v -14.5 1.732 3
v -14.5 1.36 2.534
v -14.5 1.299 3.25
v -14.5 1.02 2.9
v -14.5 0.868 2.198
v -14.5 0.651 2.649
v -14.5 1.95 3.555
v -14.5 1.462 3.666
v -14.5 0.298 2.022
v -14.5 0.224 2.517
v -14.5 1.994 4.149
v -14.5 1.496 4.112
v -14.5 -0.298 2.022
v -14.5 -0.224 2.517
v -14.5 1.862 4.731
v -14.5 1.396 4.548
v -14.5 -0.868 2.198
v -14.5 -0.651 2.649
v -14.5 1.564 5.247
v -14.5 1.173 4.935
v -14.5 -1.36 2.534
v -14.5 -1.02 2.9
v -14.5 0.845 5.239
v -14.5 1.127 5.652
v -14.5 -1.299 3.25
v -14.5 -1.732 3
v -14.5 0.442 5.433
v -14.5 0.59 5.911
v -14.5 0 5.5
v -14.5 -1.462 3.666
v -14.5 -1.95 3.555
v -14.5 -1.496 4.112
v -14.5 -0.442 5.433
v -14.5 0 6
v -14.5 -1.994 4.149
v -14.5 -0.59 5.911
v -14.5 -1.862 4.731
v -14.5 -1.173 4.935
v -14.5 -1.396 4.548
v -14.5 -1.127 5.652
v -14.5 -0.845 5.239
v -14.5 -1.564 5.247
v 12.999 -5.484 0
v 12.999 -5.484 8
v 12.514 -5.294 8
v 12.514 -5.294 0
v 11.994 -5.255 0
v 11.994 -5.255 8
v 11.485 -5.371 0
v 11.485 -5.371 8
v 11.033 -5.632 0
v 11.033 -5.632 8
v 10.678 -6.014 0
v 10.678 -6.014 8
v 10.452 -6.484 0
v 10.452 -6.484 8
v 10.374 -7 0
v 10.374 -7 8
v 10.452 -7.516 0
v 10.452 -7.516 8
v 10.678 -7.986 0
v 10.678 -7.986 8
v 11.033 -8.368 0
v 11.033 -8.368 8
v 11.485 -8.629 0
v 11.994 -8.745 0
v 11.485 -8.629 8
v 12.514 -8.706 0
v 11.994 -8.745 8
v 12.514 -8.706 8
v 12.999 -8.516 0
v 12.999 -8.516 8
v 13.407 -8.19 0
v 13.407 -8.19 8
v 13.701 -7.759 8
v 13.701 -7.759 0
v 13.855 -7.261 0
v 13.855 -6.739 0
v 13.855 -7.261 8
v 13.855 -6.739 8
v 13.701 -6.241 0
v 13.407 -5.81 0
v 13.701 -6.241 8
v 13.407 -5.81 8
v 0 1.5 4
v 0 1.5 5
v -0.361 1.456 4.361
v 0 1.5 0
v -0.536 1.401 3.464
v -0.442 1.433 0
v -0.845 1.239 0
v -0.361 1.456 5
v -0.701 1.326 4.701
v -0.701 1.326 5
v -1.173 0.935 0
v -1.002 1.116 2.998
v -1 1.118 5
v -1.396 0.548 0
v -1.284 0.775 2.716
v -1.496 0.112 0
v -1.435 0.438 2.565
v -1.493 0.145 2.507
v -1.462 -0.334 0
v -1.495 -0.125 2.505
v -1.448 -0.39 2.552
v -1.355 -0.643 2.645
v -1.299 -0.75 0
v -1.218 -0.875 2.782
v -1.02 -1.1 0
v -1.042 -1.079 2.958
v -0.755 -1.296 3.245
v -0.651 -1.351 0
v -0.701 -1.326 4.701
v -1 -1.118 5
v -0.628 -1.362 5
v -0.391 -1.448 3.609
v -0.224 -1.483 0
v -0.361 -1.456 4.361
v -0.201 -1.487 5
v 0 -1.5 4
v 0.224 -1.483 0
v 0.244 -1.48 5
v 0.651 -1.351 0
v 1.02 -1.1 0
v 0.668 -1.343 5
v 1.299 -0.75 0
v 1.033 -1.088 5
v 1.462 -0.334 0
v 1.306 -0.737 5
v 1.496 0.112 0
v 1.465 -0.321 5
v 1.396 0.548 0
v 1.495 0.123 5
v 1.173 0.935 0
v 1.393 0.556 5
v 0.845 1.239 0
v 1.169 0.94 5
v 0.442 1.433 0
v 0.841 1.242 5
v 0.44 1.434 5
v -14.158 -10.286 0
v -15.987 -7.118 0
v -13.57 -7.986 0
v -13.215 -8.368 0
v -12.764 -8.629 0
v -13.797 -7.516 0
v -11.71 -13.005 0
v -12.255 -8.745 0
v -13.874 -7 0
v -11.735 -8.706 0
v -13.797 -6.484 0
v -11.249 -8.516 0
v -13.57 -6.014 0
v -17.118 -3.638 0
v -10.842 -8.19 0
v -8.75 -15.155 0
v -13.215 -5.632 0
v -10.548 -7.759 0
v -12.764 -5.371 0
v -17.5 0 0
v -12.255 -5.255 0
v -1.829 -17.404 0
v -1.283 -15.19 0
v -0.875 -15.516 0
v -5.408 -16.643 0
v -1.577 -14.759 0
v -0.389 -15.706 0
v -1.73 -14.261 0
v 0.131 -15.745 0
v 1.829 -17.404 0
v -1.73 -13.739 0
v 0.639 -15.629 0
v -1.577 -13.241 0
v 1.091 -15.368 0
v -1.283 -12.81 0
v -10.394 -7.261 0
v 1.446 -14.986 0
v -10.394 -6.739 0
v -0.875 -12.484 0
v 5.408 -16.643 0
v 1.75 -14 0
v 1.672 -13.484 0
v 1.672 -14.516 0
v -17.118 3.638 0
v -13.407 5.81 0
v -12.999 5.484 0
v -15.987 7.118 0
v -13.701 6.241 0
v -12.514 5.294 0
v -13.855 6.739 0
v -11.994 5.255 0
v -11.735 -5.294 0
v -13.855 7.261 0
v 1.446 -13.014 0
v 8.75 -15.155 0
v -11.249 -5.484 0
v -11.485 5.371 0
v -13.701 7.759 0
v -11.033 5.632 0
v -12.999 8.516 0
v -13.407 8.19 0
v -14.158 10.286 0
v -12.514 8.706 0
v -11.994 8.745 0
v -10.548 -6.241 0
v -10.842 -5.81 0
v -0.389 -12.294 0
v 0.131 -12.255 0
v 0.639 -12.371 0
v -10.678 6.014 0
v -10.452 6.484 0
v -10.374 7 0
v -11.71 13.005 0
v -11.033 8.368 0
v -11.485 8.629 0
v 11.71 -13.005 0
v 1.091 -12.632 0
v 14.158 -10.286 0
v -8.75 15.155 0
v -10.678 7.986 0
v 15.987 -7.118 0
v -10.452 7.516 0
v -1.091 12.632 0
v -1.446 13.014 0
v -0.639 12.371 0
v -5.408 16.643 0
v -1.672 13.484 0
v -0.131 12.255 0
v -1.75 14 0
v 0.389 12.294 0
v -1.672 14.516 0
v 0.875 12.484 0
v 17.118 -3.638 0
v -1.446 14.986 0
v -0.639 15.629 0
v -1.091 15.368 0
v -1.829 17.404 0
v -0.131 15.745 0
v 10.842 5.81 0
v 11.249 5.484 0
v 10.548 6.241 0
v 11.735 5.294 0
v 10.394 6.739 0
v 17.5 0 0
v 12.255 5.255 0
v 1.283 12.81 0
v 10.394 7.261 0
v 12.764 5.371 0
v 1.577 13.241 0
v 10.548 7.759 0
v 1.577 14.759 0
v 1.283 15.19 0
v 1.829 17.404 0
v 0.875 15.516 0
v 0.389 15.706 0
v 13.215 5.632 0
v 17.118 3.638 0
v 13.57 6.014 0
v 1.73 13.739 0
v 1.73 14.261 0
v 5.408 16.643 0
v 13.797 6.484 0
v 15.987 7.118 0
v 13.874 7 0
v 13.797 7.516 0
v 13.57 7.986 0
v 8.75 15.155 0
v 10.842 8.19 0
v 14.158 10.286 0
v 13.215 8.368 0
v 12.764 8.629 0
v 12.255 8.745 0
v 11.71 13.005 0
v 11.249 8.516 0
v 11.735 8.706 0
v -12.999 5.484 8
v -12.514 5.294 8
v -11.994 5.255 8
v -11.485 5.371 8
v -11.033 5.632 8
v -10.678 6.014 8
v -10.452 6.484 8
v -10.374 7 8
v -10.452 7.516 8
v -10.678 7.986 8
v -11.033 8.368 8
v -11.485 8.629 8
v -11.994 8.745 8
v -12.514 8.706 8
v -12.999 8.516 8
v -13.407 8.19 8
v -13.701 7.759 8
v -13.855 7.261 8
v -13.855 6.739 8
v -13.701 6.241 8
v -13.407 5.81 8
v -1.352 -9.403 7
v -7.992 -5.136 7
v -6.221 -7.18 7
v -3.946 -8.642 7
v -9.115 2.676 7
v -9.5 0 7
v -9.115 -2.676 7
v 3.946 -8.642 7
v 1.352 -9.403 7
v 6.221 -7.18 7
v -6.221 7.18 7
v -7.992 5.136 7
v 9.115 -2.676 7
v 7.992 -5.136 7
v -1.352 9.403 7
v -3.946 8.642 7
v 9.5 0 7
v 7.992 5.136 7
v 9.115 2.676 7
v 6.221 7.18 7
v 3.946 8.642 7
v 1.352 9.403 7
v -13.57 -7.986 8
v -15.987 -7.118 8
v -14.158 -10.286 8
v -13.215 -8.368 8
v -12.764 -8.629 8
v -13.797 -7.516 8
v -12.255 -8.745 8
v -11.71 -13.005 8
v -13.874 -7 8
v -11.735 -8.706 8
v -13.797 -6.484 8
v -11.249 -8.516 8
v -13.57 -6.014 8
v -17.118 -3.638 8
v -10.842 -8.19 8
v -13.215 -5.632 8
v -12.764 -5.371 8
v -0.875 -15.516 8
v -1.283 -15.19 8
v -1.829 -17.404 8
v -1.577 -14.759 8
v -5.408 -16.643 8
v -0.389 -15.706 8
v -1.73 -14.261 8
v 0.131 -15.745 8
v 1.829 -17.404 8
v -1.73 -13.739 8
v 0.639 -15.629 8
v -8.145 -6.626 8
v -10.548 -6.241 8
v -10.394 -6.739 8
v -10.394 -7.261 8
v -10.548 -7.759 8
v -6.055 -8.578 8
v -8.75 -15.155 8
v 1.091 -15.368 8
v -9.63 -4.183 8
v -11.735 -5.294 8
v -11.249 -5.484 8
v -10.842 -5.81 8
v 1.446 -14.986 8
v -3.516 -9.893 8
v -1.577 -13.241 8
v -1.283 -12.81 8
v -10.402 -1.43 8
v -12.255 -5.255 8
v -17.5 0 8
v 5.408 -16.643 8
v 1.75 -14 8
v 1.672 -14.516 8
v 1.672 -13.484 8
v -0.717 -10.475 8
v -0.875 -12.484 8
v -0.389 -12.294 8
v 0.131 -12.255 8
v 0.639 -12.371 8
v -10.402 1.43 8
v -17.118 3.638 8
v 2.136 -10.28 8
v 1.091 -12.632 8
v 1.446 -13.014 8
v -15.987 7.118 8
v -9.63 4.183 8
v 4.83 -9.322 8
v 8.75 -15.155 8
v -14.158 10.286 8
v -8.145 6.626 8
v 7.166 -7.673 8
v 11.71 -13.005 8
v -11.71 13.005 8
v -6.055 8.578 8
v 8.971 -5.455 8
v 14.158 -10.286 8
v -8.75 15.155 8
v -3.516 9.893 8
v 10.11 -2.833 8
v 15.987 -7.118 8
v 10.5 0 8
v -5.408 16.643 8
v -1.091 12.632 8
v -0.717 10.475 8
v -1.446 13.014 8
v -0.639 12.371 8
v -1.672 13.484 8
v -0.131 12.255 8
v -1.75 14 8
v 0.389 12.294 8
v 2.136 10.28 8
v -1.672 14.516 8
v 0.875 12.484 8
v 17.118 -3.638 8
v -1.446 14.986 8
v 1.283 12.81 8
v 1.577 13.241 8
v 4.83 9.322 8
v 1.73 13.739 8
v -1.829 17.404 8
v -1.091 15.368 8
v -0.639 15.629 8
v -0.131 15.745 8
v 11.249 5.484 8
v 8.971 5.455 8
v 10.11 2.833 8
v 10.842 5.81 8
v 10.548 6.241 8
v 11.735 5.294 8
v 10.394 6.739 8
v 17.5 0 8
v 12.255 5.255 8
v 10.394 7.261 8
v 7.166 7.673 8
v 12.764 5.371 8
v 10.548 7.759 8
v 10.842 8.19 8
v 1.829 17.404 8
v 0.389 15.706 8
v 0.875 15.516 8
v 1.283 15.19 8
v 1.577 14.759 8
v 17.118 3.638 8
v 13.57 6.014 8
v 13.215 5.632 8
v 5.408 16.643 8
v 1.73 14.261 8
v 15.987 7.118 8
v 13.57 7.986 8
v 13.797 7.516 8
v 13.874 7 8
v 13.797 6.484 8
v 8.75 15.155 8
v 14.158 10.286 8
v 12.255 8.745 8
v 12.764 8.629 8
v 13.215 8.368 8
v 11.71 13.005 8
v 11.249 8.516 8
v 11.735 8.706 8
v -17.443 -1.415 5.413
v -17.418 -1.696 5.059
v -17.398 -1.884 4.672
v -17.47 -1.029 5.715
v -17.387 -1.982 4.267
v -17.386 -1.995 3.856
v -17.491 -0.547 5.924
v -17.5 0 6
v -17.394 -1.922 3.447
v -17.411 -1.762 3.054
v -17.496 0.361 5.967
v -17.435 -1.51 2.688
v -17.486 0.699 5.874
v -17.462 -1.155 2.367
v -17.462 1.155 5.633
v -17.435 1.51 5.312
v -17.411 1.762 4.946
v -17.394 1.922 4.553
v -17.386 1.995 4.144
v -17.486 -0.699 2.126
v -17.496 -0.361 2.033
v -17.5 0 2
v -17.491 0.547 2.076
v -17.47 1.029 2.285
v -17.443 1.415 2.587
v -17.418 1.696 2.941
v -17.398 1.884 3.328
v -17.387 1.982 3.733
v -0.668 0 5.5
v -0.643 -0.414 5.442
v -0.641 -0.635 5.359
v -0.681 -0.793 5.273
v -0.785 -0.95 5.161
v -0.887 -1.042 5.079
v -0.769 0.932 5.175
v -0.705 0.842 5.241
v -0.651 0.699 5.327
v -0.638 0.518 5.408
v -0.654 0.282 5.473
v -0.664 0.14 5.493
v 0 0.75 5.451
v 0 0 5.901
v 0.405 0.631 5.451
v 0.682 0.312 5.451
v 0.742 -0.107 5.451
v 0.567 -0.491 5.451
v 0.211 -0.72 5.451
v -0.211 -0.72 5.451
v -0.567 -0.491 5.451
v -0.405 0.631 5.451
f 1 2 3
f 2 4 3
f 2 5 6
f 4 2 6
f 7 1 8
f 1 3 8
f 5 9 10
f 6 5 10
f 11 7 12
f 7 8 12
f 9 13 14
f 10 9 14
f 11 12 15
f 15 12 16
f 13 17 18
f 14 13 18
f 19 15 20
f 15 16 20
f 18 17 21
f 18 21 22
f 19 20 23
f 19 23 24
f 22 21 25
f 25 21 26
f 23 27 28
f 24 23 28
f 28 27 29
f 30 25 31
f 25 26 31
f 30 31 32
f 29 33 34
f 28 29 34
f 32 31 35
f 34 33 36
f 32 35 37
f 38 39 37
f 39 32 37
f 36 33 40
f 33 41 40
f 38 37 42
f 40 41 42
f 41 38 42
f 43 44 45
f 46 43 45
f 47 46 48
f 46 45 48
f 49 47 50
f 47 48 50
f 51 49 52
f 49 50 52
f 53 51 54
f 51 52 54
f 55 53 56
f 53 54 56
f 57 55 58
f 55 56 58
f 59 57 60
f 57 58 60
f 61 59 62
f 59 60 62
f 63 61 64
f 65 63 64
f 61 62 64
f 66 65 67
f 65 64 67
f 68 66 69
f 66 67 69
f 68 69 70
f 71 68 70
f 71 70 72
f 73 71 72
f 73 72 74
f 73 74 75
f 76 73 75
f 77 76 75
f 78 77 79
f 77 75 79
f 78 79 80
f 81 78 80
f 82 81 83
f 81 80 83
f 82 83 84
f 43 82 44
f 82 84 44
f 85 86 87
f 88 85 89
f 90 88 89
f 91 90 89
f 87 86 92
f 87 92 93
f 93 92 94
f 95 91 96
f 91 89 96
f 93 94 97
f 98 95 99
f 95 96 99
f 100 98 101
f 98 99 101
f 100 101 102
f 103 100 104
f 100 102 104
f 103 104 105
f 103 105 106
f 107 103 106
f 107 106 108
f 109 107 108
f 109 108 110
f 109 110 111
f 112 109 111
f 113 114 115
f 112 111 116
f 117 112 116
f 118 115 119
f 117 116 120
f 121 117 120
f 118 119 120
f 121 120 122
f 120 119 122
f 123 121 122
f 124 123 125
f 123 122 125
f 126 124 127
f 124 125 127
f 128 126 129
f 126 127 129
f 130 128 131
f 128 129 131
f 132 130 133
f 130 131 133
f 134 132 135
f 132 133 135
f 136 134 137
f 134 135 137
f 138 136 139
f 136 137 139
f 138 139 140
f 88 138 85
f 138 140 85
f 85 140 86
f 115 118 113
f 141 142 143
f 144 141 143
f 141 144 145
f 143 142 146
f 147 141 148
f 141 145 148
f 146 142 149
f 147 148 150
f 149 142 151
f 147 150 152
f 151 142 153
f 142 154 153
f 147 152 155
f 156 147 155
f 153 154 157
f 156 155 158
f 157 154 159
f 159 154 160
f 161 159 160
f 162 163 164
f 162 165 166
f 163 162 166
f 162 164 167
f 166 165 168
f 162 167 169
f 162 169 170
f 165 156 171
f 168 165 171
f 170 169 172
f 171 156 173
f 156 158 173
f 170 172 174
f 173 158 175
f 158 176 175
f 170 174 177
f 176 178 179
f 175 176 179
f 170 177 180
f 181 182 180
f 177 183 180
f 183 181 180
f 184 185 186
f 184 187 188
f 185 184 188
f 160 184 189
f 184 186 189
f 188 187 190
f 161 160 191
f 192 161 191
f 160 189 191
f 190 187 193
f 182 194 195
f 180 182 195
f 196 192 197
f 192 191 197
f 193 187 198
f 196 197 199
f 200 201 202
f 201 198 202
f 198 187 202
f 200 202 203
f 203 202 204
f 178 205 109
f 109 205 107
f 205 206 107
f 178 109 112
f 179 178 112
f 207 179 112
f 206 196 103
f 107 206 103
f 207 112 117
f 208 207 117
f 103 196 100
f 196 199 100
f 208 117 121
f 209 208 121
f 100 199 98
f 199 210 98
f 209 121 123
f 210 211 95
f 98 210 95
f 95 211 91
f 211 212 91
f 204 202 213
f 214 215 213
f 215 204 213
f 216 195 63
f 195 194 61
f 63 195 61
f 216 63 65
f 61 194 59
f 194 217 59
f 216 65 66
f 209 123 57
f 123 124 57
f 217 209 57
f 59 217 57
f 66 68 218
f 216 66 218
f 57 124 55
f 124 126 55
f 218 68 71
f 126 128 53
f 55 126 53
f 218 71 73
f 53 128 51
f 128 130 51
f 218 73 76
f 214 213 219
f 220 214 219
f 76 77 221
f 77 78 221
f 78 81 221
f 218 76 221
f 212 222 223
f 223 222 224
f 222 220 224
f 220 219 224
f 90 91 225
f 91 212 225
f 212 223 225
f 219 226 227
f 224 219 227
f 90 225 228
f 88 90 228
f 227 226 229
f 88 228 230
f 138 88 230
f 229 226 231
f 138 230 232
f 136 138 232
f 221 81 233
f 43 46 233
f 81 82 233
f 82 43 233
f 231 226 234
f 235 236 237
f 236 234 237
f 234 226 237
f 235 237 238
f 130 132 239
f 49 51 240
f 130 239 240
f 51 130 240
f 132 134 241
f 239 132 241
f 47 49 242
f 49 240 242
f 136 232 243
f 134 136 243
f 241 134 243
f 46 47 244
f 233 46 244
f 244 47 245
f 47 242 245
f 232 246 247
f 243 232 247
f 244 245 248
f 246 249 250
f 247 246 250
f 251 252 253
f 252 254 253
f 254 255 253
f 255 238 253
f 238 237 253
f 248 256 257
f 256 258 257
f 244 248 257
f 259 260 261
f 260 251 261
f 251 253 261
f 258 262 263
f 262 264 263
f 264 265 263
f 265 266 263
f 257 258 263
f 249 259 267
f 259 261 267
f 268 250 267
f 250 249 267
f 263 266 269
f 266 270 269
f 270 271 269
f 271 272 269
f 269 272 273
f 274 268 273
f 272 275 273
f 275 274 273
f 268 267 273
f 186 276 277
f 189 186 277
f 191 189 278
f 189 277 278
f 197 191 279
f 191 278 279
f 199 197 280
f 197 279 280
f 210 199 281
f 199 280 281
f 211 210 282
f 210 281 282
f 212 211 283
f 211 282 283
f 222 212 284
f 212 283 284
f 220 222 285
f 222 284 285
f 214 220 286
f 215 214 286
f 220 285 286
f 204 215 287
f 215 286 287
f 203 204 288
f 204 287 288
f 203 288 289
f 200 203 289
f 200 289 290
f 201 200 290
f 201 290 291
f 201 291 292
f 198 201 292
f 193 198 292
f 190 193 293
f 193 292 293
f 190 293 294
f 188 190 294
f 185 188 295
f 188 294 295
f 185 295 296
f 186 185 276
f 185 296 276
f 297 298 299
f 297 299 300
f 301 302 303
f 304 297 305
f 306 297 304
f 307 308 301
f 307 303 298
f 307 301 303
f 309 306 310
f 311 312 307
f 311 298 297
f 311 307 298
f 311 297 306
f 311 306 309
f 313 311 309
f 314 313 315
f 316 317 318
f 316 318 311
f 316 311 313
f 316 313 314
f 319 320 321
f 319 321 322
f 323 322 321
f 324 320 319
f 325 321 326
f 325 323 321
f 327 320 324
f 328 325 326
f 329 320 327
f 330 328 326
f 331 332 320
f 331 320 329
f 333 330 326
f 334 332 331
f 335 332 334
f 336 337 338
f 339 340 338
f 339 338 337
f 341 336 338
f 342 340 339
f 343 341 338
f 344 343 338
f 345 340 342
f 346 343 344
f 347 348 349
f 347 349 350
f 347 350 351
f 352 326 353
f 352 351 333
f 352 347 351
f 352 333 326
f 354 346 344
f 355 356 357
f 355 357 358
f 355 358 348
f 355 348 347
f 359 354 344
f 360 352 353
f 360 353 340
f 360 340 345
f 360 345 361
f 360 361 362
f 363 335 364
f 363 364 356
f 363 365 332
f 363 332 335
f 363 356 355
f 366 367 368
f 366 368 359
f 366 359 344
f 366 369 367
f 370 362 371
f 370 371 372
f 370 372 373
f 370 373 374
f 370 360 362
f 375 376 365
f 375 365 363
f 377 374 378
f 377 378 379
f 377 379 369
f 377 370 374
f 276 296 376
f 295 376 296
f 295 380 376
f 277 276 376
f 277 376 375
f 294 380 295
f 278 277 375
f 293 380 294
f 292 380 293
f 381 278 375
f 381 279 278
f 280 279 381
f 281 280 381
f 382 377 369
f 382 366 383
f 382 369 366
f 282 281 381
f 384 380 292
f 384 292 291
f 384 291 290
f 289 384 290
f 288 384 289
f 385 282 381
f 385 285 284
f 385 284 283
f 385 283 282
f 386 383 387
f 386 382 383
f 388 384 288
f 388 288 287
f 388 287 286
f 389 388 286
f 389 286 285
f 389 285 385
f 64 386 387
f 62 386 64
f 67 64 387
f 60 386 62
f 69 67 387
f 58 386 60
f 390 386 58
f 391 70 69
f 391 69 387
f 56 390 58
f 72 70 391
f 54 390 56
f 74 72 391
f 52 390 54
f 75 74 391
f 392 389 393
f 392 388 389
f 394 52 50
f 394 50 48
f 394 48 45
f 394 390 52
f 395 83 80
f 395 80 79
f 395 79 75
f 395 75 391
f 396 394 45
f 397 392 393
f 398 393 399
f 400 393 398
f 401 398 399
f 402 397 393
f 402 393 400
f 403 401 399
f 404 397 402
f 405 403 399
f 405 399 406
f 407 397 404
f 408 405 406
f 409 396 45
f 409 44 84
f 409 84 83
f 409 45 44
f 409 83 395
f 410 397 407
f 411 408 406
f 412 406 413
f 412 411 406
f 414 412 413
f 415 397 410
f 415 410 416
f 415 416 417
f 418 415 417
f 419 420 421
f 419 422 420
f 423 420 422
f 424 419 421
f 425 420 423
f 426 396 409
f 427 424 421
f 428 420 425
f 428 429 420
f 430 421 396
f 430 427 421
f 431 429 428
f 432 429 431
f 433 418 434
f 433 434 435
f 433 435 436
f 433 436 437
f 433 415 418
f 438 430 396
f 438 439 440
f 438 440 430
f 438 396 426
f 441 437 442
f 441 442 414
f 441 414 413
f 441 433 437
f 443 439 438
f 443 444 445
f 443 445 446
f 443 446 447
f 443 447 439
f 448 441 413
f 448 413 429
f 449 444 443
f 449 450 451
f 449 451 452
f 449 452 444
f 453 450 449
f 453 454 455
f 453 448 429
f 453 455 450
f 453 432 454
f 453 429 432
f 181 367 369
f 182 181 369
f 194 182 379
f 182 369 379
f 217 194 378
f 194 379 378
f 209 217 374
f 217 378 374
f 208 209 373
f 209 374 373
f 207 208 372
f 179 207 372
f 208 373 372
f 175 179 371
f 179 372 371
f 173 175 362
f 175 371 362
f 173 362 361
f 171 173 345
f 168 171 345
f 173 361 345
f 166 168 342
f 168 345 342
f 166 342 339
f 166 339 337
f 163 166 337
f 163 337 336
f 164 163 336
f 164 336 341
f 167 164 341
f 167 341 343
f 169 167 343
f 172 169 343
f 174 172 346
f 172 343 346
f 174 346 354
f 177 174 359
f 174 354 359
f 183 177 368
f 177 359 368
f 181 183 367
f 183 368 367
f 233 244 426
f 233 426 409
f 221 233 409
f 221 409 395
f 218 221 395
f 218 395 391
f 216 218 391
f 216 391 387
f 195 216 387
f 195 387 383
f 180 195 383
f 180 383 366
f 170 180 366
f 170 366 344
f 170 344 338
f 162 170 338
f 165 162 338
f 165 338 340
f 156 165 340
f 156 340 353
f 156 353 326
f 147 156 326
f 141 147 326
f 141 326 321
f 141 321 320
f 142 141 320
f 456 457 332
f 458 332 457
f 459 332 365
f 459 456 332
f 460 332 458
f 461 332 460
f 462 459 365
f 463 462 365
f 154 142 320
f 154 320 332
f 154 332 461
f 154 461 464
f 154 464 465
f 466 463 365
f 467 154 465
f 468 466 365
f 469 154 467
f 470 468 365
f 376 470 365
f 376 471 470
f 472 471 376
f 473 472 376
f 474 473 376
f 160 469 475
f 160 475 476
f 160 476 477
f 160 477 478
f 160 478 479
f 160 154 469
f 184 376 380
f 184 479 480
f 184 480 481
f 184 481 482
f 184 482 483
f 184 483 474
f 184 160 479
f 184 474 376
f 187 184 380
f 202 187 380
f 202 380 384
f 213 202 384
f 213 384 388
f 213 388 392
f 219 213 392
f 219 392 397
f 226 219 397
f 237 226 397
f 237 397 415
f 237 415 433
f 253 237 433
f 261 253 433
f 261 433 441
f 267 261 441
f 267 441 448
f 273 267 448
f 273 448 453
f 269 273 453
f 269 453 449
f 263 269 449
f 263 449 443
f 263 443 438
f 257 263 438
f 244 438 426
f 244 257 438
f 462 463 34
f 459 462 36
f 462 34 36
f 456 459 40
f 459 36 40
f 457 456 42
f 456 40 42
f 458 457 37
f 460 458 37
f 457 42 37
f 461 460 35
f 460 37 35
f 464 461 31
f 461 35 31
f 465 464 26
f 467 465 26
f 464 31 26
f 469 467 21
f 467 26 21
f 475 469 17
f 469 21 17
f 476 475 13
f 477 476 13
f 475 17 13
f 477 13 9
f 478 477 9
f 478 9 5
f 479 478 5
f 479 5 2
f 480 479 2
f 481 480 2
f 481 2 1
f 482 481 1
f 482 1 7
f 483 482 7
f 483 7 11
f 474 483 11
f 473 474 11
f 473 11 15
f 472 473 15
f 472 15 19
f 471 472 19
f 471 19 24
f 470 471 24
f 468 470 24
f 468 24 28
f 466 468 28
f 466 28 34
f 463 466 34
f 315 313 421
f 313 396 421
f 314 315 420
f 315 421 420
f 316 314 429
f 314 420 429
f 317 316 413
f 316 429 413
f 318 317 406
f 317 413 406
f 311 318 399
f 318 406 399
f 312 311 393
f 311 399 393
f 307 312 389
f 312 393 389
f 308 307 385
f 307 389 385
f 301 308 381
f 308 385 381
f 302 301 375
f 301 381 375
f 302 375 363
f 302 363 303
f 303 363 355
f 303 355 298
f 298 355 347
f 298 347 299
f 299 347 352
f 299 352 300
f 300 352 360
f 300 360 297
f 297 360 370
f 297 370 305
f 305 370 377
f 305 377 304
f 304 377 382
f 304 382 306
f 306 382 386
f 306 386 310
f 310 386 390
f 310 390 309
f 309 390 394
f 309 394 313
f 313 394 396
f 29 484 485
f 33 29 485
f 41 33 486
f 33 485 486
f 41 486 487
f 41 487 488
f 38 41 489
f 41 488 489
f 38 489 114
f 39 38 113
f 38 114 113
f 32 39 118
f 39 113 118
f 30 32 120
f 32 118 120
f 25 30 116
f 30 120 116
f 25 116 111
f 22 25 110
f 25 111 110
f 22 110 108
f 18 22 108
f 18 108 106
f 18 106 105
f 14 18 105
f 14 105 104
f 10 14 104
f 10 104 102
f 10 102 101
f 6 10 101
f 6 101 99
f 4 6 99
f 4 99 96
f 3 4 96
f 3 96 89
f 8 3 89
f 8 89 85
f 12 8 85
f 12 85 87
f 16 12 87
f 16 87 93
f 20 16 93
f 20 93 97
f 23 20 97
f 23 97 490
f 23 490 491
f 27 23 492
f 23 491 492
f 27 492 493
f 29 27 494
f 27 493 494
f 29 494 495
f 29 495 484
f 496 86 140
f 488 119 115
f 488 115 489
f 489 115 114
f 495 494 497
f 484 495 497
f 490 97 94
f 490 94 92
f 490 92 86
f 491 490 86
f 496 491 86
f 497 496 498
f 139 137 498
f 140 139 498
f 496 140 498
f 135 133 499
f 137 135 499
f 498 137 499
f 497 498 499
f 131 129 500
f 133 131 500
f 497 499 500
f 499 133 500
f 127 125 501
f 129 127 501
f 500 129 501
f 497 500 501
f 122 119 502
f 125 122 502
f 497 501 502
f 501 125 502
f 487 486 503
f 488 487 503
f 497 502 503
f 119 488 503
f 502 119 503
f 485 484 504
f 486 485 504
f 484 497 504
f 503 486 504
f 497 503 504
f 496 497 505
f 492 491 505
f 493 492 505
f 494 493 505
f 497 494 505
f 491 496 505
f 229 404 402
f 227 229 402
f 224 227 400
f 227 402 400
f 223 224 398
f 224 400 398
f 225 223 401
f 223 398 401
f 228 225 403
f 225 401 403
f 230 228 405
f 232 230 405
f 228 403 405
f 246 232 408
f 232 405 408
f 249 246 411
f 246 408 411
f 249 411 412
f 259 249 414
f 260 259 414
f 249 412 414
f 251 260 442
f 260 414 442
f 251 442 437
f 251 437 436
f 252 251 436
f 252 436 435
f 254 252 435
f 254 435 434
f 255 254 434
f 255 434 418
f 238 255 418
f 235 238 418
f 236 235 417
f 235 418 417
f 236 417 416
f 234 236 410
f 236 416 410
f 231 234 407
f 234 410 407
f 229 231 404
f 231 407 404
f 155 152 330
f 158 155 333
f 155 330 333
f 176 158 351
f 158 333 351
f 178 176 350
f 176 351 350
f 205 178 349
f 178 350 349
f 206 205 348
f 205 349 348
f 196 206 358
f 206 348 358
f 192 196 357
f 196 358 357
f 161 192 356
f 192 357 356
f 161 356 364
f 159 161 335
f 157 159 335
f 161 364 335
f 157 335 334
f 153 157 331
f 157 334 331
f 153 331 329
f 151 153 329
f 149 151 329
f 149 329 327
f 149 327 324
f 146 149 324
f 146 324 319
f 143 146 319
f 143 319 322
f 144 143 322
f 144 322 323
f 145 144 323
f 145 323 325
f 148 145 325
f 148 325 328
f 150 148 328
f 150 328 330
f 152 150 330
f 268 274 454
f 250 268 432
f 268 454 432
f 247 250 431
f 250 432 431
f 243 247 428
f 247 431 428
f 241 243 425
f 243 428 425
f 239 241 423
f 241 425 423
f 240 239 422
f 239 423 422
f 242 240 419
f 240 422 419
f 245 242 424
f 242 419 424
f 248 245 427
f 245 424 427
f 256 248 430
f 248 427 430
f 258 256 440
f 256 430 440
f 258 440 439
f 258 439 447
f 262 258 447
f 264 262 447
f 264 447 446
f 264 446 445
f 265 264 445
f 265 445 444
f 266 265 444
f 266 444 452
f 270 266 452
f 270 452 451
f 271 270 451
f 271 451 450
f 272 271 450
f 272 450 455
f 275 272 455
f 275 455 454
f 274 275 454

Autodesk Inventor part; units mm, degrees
ref_plane "XZ Plane" through (0, 0, 0) normal (0, 1, 0) x (-1, 0, 0)
ref_plane "XY Plane" through (0, 0, 0) normal (0, 0, 1) x (1, 0, 0)
sketch "Skizze1" plane through (0, 0, 0) normal (0, 0, 1) x (1, 0, 0)
  circle A0 centre (0, 0) radius 17.5
  line L0 (-24.5, 0) -> (24.5, 0) projected
  line L1 (0, -24.5) -> (0, 24.5) projected
  dimension "d0" = 35
extrude "Extrusion1" add sketch "Skizze1" along normal blind 8
sketch "Skizze2" plane through (0, 0, 8) normal (0, 0, 1) x (1, 0, 0)
  line L0 (0, -24.5) -> (0, 24.5) projected
  line L1 (-24.5, 0) -> (24.5, 0) projected
  circle A0 centre (0, 0) radius 9.5
  dimension "d3" = 19
extrude "Extrusion2" cut sketch "Skizze2" against normal blind 1
chamfer "Fase1" distance 1 angle 45 1 edges at (-9.5, 0, 8)
sketch "Skizze3" plane through (0, 0, 8) normal (0, 0, 1) x (1, 0, 0)
  line L0 (0, -24.5) -> (0, 24.5) projected
  line L1 (-24.5, 0) -> (24.5, 0) projected
  circle A0 centre (0, -14) radius 1.75
  point P0 (0, 0)
  dimension "d11" = 3.5
  dimension "d12" = 14
extrude "Extrusion3" cut sketch "Skizze3" against normal up to surface (8 mm away)
pattern_circular "Runde Anordnung1" count 6 over 360 about axis through (0, 0, 7.5) along (0, 0, 1) of "Extrusion3"
sketch "Skizze4" plane through (0, 0, 0) normal (0, 0, -1) x (-1, 0, 0)
  point P0 (0, 0)
  point P1 (0, 0)
hole "Bohrung1" at (0, 0, 0) direction (0, 0, 1) diameter 3 depth 5 tip angle 118
ref_plane "Arbeitsebene3" through (-17.5, 0, 0) normal (1, 0, 0) x (0, 1, 0)
sketch "Skizze7" plane through (-17.5, 0, 0) normal (1, 0, 0) x (0, 1, 0)
  line L0 (-24.5, 0) -> (24.5, 0) projected
  line L1 (0, -1.6) -> (0, 9.6) projected
  point P0 (0, 0)
  point P1 (0, 4)
  dimension "d28" = 4
hole "Bohrung2" at (-17.5, 0, 4) direction (1, 0, 0) diameter 3 depth 17.5 tip angle 118 counterbore diameter 4 counterbore depth 3
properties part number "Flansch"
